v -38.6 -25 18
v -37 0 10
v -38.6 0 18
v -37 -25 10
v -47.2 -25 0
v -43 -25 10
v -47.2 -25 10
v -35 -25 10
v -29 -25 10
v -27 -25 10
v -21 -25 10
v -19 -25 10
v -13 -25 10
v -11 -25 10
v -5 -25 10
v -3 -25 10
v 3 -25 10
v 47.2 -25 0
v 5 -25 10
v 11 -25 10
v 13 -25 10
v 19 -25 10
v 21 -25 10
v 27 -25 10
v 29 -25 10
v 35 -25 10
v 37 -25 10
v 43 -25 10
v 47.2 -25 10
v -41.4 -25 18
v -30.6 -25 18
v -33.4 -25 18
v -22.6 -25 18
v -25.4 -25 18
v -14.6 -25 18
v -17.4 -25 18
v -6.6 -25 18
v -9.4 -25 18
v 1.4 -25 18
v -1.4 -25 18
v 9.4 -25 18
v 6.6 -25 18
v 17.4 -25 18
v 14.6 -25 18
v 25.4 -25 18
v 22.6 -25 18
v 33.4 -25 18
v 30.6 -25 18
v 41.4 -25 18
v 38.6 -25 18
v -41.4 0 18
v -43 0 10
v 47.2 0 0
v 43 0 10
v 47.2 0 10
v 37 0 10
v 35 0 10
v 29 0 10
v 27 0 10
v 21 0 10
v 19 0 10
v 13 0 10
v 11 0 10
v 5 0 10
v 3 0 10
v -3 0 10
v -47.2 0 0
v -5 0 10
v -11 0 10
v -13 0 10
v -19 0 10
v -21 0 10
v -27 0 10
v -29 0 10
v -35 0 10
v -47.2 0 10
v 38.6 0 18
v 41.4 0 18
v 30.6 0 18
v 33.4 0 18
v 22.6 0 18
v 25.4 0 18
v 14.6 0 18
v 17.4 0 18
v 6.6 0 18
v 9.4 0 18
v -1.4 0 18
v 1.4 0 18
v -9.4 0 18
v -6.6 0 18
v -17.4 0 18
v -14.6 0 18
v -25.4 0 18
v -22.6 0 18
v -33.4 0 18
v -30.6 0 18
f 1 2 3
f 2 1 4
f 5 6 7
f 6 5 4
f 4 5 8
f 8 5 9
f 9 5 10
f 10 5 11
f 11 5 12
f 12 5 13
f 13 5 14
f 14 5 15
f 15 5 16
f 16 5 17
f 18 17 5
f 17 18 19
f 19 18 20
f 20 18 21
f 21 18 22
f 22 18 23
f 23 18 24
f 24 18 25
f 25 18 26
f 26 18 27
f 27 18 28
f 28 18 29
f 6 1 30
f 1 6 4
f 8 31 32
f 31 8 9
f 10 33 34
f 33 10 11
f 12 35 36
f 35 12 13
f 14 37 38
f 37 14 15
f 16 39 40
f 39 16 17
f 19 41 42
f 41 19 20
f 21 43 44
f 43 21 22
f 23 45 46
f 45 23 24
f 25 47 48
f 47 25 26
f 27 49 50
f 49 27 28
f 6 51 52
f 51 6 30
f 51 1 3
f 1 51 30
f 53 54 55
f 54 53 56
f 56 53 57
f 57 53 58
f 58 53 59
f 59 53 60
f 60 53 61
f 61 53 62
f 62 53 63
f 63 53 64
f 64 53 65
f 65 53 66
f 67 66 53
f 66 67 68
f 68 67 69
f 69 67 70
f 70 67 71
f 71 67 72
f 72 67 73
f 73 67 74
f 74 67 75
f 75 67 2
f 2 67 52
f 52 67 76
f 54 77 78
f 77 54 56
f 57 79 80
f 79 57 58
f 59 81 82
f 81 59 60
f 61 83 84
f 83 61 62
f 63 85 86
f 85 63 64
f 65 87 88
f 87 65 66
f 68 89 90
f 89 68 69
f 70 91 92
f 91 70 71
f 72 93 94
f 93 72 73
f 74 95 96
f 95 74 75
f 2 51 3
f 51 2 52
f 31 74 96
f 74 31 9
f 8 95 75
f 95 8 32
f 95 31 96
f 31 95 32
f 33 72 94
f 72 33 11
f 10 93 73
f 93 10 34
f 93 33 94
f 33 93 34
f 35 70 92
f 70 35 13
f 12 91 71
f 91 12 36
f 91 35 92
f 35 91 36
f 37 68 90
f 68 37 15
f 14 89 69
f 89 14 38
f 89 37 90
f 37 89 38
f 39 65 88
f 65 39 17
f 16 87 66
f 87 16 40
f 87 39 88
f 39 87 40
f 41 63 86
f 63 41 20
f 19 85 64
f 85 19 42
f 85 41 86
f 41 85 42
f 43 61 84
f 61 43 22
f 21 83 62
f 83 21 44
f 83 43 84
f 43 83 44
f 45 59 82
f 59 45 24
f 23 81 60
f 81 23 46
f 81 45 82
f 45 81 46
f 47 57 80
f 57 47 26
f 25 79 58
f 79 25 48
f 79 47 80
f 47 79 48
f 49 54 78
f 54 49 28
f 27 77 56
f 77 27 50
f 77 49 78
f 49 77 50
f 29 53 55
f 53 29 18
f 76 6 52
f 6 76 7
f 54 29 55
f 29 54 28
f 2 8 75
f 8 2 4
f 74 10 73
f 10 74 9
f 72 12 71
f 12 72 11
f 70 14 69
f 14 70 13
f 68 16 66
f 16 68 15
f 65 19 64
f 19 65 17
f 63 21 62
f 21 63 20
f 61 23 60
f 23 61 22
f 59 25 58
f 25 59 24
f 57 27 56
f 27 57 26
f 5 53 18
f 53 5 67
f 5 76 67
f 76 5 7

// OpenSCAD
$fn = 32;

// ----------------------------------------------------------------------
// Toothed rack, 11 teeth
// 8 mm pitch, 8 mm teeth
// ----------------------------------------------------------------------

// --- parameters (mm) ---
bar_w = 25;     // bar width (Y)
bar_h = 10;     // bar height (Z)
teeth = 11;     // number of teeth
pitch = 8;      // tooth pitch
tooth_h = 8;    // tooth height above the bar
root_w = 6.4;   // tooth width at the root
crest_w = 2.8;  // tooth width at the crest

// --- derived feature positions (mm) ---
span = (teeth - 1) * pitch;  // = 80   distance between the outer teeth
bar_l = span + root_w + 8;   // = 94.4   bar length: teeth plus 4 mm at each end
tooth_x = -span / 2;         // = -40   X of the first tooth
height = bar_h + tooth_h;    // = 18   overall height
feature_centers = [
  [tooth_x + 0 * pitch, -bar_w / 2],
  [tooth_x + 1 * pitch, -bar_w / 2],
  [tooth_x + 2 * pitch, -bar_w / 2],
  [tooth_x + 3 * pitch, -bar_w / 2],
  [tooth_x + 4 * pitch, -bar_w / 2],
  [tooth_x + 5 * pitch, -bar_w / 2],
  [tooth_x + 6 * pitch, -bar_w / 2],
  [tooth_x + 7 * pitch, -bar_w / 2],
  [tooth_x + 8 * pitch, -bar_w / 2],
  [tooth_x + 9 * pitch, -bar_w / 2],
  [tooth_x + 10 * pitch, -bar_w / 2]
];   // tooth centre line, drives the tooth loop

// bar with a rack of teeth, one extruded trapezoium per centre
module rack_tooth() {
  linear_extrude(height = bar_w)
    polygon(points = [
      [0, 0],
      [root_w, 0],
      [root_w / 2 + crest_w / 2, tooth_h + 1],
      [root_w / 2 - crest_w / 2, tooth_h + 1]
    ]);
}

union() {
  translate([-bar_l / 2, -bar_w, 0]) cube([bar_l, bar_w, bar_h]);
  for (centre = feature_centers)
    translate([centre[0] - root_w / 2, 0, bar_h - 1]) rotate([90, 0, 0]) rack_tooth();
}
